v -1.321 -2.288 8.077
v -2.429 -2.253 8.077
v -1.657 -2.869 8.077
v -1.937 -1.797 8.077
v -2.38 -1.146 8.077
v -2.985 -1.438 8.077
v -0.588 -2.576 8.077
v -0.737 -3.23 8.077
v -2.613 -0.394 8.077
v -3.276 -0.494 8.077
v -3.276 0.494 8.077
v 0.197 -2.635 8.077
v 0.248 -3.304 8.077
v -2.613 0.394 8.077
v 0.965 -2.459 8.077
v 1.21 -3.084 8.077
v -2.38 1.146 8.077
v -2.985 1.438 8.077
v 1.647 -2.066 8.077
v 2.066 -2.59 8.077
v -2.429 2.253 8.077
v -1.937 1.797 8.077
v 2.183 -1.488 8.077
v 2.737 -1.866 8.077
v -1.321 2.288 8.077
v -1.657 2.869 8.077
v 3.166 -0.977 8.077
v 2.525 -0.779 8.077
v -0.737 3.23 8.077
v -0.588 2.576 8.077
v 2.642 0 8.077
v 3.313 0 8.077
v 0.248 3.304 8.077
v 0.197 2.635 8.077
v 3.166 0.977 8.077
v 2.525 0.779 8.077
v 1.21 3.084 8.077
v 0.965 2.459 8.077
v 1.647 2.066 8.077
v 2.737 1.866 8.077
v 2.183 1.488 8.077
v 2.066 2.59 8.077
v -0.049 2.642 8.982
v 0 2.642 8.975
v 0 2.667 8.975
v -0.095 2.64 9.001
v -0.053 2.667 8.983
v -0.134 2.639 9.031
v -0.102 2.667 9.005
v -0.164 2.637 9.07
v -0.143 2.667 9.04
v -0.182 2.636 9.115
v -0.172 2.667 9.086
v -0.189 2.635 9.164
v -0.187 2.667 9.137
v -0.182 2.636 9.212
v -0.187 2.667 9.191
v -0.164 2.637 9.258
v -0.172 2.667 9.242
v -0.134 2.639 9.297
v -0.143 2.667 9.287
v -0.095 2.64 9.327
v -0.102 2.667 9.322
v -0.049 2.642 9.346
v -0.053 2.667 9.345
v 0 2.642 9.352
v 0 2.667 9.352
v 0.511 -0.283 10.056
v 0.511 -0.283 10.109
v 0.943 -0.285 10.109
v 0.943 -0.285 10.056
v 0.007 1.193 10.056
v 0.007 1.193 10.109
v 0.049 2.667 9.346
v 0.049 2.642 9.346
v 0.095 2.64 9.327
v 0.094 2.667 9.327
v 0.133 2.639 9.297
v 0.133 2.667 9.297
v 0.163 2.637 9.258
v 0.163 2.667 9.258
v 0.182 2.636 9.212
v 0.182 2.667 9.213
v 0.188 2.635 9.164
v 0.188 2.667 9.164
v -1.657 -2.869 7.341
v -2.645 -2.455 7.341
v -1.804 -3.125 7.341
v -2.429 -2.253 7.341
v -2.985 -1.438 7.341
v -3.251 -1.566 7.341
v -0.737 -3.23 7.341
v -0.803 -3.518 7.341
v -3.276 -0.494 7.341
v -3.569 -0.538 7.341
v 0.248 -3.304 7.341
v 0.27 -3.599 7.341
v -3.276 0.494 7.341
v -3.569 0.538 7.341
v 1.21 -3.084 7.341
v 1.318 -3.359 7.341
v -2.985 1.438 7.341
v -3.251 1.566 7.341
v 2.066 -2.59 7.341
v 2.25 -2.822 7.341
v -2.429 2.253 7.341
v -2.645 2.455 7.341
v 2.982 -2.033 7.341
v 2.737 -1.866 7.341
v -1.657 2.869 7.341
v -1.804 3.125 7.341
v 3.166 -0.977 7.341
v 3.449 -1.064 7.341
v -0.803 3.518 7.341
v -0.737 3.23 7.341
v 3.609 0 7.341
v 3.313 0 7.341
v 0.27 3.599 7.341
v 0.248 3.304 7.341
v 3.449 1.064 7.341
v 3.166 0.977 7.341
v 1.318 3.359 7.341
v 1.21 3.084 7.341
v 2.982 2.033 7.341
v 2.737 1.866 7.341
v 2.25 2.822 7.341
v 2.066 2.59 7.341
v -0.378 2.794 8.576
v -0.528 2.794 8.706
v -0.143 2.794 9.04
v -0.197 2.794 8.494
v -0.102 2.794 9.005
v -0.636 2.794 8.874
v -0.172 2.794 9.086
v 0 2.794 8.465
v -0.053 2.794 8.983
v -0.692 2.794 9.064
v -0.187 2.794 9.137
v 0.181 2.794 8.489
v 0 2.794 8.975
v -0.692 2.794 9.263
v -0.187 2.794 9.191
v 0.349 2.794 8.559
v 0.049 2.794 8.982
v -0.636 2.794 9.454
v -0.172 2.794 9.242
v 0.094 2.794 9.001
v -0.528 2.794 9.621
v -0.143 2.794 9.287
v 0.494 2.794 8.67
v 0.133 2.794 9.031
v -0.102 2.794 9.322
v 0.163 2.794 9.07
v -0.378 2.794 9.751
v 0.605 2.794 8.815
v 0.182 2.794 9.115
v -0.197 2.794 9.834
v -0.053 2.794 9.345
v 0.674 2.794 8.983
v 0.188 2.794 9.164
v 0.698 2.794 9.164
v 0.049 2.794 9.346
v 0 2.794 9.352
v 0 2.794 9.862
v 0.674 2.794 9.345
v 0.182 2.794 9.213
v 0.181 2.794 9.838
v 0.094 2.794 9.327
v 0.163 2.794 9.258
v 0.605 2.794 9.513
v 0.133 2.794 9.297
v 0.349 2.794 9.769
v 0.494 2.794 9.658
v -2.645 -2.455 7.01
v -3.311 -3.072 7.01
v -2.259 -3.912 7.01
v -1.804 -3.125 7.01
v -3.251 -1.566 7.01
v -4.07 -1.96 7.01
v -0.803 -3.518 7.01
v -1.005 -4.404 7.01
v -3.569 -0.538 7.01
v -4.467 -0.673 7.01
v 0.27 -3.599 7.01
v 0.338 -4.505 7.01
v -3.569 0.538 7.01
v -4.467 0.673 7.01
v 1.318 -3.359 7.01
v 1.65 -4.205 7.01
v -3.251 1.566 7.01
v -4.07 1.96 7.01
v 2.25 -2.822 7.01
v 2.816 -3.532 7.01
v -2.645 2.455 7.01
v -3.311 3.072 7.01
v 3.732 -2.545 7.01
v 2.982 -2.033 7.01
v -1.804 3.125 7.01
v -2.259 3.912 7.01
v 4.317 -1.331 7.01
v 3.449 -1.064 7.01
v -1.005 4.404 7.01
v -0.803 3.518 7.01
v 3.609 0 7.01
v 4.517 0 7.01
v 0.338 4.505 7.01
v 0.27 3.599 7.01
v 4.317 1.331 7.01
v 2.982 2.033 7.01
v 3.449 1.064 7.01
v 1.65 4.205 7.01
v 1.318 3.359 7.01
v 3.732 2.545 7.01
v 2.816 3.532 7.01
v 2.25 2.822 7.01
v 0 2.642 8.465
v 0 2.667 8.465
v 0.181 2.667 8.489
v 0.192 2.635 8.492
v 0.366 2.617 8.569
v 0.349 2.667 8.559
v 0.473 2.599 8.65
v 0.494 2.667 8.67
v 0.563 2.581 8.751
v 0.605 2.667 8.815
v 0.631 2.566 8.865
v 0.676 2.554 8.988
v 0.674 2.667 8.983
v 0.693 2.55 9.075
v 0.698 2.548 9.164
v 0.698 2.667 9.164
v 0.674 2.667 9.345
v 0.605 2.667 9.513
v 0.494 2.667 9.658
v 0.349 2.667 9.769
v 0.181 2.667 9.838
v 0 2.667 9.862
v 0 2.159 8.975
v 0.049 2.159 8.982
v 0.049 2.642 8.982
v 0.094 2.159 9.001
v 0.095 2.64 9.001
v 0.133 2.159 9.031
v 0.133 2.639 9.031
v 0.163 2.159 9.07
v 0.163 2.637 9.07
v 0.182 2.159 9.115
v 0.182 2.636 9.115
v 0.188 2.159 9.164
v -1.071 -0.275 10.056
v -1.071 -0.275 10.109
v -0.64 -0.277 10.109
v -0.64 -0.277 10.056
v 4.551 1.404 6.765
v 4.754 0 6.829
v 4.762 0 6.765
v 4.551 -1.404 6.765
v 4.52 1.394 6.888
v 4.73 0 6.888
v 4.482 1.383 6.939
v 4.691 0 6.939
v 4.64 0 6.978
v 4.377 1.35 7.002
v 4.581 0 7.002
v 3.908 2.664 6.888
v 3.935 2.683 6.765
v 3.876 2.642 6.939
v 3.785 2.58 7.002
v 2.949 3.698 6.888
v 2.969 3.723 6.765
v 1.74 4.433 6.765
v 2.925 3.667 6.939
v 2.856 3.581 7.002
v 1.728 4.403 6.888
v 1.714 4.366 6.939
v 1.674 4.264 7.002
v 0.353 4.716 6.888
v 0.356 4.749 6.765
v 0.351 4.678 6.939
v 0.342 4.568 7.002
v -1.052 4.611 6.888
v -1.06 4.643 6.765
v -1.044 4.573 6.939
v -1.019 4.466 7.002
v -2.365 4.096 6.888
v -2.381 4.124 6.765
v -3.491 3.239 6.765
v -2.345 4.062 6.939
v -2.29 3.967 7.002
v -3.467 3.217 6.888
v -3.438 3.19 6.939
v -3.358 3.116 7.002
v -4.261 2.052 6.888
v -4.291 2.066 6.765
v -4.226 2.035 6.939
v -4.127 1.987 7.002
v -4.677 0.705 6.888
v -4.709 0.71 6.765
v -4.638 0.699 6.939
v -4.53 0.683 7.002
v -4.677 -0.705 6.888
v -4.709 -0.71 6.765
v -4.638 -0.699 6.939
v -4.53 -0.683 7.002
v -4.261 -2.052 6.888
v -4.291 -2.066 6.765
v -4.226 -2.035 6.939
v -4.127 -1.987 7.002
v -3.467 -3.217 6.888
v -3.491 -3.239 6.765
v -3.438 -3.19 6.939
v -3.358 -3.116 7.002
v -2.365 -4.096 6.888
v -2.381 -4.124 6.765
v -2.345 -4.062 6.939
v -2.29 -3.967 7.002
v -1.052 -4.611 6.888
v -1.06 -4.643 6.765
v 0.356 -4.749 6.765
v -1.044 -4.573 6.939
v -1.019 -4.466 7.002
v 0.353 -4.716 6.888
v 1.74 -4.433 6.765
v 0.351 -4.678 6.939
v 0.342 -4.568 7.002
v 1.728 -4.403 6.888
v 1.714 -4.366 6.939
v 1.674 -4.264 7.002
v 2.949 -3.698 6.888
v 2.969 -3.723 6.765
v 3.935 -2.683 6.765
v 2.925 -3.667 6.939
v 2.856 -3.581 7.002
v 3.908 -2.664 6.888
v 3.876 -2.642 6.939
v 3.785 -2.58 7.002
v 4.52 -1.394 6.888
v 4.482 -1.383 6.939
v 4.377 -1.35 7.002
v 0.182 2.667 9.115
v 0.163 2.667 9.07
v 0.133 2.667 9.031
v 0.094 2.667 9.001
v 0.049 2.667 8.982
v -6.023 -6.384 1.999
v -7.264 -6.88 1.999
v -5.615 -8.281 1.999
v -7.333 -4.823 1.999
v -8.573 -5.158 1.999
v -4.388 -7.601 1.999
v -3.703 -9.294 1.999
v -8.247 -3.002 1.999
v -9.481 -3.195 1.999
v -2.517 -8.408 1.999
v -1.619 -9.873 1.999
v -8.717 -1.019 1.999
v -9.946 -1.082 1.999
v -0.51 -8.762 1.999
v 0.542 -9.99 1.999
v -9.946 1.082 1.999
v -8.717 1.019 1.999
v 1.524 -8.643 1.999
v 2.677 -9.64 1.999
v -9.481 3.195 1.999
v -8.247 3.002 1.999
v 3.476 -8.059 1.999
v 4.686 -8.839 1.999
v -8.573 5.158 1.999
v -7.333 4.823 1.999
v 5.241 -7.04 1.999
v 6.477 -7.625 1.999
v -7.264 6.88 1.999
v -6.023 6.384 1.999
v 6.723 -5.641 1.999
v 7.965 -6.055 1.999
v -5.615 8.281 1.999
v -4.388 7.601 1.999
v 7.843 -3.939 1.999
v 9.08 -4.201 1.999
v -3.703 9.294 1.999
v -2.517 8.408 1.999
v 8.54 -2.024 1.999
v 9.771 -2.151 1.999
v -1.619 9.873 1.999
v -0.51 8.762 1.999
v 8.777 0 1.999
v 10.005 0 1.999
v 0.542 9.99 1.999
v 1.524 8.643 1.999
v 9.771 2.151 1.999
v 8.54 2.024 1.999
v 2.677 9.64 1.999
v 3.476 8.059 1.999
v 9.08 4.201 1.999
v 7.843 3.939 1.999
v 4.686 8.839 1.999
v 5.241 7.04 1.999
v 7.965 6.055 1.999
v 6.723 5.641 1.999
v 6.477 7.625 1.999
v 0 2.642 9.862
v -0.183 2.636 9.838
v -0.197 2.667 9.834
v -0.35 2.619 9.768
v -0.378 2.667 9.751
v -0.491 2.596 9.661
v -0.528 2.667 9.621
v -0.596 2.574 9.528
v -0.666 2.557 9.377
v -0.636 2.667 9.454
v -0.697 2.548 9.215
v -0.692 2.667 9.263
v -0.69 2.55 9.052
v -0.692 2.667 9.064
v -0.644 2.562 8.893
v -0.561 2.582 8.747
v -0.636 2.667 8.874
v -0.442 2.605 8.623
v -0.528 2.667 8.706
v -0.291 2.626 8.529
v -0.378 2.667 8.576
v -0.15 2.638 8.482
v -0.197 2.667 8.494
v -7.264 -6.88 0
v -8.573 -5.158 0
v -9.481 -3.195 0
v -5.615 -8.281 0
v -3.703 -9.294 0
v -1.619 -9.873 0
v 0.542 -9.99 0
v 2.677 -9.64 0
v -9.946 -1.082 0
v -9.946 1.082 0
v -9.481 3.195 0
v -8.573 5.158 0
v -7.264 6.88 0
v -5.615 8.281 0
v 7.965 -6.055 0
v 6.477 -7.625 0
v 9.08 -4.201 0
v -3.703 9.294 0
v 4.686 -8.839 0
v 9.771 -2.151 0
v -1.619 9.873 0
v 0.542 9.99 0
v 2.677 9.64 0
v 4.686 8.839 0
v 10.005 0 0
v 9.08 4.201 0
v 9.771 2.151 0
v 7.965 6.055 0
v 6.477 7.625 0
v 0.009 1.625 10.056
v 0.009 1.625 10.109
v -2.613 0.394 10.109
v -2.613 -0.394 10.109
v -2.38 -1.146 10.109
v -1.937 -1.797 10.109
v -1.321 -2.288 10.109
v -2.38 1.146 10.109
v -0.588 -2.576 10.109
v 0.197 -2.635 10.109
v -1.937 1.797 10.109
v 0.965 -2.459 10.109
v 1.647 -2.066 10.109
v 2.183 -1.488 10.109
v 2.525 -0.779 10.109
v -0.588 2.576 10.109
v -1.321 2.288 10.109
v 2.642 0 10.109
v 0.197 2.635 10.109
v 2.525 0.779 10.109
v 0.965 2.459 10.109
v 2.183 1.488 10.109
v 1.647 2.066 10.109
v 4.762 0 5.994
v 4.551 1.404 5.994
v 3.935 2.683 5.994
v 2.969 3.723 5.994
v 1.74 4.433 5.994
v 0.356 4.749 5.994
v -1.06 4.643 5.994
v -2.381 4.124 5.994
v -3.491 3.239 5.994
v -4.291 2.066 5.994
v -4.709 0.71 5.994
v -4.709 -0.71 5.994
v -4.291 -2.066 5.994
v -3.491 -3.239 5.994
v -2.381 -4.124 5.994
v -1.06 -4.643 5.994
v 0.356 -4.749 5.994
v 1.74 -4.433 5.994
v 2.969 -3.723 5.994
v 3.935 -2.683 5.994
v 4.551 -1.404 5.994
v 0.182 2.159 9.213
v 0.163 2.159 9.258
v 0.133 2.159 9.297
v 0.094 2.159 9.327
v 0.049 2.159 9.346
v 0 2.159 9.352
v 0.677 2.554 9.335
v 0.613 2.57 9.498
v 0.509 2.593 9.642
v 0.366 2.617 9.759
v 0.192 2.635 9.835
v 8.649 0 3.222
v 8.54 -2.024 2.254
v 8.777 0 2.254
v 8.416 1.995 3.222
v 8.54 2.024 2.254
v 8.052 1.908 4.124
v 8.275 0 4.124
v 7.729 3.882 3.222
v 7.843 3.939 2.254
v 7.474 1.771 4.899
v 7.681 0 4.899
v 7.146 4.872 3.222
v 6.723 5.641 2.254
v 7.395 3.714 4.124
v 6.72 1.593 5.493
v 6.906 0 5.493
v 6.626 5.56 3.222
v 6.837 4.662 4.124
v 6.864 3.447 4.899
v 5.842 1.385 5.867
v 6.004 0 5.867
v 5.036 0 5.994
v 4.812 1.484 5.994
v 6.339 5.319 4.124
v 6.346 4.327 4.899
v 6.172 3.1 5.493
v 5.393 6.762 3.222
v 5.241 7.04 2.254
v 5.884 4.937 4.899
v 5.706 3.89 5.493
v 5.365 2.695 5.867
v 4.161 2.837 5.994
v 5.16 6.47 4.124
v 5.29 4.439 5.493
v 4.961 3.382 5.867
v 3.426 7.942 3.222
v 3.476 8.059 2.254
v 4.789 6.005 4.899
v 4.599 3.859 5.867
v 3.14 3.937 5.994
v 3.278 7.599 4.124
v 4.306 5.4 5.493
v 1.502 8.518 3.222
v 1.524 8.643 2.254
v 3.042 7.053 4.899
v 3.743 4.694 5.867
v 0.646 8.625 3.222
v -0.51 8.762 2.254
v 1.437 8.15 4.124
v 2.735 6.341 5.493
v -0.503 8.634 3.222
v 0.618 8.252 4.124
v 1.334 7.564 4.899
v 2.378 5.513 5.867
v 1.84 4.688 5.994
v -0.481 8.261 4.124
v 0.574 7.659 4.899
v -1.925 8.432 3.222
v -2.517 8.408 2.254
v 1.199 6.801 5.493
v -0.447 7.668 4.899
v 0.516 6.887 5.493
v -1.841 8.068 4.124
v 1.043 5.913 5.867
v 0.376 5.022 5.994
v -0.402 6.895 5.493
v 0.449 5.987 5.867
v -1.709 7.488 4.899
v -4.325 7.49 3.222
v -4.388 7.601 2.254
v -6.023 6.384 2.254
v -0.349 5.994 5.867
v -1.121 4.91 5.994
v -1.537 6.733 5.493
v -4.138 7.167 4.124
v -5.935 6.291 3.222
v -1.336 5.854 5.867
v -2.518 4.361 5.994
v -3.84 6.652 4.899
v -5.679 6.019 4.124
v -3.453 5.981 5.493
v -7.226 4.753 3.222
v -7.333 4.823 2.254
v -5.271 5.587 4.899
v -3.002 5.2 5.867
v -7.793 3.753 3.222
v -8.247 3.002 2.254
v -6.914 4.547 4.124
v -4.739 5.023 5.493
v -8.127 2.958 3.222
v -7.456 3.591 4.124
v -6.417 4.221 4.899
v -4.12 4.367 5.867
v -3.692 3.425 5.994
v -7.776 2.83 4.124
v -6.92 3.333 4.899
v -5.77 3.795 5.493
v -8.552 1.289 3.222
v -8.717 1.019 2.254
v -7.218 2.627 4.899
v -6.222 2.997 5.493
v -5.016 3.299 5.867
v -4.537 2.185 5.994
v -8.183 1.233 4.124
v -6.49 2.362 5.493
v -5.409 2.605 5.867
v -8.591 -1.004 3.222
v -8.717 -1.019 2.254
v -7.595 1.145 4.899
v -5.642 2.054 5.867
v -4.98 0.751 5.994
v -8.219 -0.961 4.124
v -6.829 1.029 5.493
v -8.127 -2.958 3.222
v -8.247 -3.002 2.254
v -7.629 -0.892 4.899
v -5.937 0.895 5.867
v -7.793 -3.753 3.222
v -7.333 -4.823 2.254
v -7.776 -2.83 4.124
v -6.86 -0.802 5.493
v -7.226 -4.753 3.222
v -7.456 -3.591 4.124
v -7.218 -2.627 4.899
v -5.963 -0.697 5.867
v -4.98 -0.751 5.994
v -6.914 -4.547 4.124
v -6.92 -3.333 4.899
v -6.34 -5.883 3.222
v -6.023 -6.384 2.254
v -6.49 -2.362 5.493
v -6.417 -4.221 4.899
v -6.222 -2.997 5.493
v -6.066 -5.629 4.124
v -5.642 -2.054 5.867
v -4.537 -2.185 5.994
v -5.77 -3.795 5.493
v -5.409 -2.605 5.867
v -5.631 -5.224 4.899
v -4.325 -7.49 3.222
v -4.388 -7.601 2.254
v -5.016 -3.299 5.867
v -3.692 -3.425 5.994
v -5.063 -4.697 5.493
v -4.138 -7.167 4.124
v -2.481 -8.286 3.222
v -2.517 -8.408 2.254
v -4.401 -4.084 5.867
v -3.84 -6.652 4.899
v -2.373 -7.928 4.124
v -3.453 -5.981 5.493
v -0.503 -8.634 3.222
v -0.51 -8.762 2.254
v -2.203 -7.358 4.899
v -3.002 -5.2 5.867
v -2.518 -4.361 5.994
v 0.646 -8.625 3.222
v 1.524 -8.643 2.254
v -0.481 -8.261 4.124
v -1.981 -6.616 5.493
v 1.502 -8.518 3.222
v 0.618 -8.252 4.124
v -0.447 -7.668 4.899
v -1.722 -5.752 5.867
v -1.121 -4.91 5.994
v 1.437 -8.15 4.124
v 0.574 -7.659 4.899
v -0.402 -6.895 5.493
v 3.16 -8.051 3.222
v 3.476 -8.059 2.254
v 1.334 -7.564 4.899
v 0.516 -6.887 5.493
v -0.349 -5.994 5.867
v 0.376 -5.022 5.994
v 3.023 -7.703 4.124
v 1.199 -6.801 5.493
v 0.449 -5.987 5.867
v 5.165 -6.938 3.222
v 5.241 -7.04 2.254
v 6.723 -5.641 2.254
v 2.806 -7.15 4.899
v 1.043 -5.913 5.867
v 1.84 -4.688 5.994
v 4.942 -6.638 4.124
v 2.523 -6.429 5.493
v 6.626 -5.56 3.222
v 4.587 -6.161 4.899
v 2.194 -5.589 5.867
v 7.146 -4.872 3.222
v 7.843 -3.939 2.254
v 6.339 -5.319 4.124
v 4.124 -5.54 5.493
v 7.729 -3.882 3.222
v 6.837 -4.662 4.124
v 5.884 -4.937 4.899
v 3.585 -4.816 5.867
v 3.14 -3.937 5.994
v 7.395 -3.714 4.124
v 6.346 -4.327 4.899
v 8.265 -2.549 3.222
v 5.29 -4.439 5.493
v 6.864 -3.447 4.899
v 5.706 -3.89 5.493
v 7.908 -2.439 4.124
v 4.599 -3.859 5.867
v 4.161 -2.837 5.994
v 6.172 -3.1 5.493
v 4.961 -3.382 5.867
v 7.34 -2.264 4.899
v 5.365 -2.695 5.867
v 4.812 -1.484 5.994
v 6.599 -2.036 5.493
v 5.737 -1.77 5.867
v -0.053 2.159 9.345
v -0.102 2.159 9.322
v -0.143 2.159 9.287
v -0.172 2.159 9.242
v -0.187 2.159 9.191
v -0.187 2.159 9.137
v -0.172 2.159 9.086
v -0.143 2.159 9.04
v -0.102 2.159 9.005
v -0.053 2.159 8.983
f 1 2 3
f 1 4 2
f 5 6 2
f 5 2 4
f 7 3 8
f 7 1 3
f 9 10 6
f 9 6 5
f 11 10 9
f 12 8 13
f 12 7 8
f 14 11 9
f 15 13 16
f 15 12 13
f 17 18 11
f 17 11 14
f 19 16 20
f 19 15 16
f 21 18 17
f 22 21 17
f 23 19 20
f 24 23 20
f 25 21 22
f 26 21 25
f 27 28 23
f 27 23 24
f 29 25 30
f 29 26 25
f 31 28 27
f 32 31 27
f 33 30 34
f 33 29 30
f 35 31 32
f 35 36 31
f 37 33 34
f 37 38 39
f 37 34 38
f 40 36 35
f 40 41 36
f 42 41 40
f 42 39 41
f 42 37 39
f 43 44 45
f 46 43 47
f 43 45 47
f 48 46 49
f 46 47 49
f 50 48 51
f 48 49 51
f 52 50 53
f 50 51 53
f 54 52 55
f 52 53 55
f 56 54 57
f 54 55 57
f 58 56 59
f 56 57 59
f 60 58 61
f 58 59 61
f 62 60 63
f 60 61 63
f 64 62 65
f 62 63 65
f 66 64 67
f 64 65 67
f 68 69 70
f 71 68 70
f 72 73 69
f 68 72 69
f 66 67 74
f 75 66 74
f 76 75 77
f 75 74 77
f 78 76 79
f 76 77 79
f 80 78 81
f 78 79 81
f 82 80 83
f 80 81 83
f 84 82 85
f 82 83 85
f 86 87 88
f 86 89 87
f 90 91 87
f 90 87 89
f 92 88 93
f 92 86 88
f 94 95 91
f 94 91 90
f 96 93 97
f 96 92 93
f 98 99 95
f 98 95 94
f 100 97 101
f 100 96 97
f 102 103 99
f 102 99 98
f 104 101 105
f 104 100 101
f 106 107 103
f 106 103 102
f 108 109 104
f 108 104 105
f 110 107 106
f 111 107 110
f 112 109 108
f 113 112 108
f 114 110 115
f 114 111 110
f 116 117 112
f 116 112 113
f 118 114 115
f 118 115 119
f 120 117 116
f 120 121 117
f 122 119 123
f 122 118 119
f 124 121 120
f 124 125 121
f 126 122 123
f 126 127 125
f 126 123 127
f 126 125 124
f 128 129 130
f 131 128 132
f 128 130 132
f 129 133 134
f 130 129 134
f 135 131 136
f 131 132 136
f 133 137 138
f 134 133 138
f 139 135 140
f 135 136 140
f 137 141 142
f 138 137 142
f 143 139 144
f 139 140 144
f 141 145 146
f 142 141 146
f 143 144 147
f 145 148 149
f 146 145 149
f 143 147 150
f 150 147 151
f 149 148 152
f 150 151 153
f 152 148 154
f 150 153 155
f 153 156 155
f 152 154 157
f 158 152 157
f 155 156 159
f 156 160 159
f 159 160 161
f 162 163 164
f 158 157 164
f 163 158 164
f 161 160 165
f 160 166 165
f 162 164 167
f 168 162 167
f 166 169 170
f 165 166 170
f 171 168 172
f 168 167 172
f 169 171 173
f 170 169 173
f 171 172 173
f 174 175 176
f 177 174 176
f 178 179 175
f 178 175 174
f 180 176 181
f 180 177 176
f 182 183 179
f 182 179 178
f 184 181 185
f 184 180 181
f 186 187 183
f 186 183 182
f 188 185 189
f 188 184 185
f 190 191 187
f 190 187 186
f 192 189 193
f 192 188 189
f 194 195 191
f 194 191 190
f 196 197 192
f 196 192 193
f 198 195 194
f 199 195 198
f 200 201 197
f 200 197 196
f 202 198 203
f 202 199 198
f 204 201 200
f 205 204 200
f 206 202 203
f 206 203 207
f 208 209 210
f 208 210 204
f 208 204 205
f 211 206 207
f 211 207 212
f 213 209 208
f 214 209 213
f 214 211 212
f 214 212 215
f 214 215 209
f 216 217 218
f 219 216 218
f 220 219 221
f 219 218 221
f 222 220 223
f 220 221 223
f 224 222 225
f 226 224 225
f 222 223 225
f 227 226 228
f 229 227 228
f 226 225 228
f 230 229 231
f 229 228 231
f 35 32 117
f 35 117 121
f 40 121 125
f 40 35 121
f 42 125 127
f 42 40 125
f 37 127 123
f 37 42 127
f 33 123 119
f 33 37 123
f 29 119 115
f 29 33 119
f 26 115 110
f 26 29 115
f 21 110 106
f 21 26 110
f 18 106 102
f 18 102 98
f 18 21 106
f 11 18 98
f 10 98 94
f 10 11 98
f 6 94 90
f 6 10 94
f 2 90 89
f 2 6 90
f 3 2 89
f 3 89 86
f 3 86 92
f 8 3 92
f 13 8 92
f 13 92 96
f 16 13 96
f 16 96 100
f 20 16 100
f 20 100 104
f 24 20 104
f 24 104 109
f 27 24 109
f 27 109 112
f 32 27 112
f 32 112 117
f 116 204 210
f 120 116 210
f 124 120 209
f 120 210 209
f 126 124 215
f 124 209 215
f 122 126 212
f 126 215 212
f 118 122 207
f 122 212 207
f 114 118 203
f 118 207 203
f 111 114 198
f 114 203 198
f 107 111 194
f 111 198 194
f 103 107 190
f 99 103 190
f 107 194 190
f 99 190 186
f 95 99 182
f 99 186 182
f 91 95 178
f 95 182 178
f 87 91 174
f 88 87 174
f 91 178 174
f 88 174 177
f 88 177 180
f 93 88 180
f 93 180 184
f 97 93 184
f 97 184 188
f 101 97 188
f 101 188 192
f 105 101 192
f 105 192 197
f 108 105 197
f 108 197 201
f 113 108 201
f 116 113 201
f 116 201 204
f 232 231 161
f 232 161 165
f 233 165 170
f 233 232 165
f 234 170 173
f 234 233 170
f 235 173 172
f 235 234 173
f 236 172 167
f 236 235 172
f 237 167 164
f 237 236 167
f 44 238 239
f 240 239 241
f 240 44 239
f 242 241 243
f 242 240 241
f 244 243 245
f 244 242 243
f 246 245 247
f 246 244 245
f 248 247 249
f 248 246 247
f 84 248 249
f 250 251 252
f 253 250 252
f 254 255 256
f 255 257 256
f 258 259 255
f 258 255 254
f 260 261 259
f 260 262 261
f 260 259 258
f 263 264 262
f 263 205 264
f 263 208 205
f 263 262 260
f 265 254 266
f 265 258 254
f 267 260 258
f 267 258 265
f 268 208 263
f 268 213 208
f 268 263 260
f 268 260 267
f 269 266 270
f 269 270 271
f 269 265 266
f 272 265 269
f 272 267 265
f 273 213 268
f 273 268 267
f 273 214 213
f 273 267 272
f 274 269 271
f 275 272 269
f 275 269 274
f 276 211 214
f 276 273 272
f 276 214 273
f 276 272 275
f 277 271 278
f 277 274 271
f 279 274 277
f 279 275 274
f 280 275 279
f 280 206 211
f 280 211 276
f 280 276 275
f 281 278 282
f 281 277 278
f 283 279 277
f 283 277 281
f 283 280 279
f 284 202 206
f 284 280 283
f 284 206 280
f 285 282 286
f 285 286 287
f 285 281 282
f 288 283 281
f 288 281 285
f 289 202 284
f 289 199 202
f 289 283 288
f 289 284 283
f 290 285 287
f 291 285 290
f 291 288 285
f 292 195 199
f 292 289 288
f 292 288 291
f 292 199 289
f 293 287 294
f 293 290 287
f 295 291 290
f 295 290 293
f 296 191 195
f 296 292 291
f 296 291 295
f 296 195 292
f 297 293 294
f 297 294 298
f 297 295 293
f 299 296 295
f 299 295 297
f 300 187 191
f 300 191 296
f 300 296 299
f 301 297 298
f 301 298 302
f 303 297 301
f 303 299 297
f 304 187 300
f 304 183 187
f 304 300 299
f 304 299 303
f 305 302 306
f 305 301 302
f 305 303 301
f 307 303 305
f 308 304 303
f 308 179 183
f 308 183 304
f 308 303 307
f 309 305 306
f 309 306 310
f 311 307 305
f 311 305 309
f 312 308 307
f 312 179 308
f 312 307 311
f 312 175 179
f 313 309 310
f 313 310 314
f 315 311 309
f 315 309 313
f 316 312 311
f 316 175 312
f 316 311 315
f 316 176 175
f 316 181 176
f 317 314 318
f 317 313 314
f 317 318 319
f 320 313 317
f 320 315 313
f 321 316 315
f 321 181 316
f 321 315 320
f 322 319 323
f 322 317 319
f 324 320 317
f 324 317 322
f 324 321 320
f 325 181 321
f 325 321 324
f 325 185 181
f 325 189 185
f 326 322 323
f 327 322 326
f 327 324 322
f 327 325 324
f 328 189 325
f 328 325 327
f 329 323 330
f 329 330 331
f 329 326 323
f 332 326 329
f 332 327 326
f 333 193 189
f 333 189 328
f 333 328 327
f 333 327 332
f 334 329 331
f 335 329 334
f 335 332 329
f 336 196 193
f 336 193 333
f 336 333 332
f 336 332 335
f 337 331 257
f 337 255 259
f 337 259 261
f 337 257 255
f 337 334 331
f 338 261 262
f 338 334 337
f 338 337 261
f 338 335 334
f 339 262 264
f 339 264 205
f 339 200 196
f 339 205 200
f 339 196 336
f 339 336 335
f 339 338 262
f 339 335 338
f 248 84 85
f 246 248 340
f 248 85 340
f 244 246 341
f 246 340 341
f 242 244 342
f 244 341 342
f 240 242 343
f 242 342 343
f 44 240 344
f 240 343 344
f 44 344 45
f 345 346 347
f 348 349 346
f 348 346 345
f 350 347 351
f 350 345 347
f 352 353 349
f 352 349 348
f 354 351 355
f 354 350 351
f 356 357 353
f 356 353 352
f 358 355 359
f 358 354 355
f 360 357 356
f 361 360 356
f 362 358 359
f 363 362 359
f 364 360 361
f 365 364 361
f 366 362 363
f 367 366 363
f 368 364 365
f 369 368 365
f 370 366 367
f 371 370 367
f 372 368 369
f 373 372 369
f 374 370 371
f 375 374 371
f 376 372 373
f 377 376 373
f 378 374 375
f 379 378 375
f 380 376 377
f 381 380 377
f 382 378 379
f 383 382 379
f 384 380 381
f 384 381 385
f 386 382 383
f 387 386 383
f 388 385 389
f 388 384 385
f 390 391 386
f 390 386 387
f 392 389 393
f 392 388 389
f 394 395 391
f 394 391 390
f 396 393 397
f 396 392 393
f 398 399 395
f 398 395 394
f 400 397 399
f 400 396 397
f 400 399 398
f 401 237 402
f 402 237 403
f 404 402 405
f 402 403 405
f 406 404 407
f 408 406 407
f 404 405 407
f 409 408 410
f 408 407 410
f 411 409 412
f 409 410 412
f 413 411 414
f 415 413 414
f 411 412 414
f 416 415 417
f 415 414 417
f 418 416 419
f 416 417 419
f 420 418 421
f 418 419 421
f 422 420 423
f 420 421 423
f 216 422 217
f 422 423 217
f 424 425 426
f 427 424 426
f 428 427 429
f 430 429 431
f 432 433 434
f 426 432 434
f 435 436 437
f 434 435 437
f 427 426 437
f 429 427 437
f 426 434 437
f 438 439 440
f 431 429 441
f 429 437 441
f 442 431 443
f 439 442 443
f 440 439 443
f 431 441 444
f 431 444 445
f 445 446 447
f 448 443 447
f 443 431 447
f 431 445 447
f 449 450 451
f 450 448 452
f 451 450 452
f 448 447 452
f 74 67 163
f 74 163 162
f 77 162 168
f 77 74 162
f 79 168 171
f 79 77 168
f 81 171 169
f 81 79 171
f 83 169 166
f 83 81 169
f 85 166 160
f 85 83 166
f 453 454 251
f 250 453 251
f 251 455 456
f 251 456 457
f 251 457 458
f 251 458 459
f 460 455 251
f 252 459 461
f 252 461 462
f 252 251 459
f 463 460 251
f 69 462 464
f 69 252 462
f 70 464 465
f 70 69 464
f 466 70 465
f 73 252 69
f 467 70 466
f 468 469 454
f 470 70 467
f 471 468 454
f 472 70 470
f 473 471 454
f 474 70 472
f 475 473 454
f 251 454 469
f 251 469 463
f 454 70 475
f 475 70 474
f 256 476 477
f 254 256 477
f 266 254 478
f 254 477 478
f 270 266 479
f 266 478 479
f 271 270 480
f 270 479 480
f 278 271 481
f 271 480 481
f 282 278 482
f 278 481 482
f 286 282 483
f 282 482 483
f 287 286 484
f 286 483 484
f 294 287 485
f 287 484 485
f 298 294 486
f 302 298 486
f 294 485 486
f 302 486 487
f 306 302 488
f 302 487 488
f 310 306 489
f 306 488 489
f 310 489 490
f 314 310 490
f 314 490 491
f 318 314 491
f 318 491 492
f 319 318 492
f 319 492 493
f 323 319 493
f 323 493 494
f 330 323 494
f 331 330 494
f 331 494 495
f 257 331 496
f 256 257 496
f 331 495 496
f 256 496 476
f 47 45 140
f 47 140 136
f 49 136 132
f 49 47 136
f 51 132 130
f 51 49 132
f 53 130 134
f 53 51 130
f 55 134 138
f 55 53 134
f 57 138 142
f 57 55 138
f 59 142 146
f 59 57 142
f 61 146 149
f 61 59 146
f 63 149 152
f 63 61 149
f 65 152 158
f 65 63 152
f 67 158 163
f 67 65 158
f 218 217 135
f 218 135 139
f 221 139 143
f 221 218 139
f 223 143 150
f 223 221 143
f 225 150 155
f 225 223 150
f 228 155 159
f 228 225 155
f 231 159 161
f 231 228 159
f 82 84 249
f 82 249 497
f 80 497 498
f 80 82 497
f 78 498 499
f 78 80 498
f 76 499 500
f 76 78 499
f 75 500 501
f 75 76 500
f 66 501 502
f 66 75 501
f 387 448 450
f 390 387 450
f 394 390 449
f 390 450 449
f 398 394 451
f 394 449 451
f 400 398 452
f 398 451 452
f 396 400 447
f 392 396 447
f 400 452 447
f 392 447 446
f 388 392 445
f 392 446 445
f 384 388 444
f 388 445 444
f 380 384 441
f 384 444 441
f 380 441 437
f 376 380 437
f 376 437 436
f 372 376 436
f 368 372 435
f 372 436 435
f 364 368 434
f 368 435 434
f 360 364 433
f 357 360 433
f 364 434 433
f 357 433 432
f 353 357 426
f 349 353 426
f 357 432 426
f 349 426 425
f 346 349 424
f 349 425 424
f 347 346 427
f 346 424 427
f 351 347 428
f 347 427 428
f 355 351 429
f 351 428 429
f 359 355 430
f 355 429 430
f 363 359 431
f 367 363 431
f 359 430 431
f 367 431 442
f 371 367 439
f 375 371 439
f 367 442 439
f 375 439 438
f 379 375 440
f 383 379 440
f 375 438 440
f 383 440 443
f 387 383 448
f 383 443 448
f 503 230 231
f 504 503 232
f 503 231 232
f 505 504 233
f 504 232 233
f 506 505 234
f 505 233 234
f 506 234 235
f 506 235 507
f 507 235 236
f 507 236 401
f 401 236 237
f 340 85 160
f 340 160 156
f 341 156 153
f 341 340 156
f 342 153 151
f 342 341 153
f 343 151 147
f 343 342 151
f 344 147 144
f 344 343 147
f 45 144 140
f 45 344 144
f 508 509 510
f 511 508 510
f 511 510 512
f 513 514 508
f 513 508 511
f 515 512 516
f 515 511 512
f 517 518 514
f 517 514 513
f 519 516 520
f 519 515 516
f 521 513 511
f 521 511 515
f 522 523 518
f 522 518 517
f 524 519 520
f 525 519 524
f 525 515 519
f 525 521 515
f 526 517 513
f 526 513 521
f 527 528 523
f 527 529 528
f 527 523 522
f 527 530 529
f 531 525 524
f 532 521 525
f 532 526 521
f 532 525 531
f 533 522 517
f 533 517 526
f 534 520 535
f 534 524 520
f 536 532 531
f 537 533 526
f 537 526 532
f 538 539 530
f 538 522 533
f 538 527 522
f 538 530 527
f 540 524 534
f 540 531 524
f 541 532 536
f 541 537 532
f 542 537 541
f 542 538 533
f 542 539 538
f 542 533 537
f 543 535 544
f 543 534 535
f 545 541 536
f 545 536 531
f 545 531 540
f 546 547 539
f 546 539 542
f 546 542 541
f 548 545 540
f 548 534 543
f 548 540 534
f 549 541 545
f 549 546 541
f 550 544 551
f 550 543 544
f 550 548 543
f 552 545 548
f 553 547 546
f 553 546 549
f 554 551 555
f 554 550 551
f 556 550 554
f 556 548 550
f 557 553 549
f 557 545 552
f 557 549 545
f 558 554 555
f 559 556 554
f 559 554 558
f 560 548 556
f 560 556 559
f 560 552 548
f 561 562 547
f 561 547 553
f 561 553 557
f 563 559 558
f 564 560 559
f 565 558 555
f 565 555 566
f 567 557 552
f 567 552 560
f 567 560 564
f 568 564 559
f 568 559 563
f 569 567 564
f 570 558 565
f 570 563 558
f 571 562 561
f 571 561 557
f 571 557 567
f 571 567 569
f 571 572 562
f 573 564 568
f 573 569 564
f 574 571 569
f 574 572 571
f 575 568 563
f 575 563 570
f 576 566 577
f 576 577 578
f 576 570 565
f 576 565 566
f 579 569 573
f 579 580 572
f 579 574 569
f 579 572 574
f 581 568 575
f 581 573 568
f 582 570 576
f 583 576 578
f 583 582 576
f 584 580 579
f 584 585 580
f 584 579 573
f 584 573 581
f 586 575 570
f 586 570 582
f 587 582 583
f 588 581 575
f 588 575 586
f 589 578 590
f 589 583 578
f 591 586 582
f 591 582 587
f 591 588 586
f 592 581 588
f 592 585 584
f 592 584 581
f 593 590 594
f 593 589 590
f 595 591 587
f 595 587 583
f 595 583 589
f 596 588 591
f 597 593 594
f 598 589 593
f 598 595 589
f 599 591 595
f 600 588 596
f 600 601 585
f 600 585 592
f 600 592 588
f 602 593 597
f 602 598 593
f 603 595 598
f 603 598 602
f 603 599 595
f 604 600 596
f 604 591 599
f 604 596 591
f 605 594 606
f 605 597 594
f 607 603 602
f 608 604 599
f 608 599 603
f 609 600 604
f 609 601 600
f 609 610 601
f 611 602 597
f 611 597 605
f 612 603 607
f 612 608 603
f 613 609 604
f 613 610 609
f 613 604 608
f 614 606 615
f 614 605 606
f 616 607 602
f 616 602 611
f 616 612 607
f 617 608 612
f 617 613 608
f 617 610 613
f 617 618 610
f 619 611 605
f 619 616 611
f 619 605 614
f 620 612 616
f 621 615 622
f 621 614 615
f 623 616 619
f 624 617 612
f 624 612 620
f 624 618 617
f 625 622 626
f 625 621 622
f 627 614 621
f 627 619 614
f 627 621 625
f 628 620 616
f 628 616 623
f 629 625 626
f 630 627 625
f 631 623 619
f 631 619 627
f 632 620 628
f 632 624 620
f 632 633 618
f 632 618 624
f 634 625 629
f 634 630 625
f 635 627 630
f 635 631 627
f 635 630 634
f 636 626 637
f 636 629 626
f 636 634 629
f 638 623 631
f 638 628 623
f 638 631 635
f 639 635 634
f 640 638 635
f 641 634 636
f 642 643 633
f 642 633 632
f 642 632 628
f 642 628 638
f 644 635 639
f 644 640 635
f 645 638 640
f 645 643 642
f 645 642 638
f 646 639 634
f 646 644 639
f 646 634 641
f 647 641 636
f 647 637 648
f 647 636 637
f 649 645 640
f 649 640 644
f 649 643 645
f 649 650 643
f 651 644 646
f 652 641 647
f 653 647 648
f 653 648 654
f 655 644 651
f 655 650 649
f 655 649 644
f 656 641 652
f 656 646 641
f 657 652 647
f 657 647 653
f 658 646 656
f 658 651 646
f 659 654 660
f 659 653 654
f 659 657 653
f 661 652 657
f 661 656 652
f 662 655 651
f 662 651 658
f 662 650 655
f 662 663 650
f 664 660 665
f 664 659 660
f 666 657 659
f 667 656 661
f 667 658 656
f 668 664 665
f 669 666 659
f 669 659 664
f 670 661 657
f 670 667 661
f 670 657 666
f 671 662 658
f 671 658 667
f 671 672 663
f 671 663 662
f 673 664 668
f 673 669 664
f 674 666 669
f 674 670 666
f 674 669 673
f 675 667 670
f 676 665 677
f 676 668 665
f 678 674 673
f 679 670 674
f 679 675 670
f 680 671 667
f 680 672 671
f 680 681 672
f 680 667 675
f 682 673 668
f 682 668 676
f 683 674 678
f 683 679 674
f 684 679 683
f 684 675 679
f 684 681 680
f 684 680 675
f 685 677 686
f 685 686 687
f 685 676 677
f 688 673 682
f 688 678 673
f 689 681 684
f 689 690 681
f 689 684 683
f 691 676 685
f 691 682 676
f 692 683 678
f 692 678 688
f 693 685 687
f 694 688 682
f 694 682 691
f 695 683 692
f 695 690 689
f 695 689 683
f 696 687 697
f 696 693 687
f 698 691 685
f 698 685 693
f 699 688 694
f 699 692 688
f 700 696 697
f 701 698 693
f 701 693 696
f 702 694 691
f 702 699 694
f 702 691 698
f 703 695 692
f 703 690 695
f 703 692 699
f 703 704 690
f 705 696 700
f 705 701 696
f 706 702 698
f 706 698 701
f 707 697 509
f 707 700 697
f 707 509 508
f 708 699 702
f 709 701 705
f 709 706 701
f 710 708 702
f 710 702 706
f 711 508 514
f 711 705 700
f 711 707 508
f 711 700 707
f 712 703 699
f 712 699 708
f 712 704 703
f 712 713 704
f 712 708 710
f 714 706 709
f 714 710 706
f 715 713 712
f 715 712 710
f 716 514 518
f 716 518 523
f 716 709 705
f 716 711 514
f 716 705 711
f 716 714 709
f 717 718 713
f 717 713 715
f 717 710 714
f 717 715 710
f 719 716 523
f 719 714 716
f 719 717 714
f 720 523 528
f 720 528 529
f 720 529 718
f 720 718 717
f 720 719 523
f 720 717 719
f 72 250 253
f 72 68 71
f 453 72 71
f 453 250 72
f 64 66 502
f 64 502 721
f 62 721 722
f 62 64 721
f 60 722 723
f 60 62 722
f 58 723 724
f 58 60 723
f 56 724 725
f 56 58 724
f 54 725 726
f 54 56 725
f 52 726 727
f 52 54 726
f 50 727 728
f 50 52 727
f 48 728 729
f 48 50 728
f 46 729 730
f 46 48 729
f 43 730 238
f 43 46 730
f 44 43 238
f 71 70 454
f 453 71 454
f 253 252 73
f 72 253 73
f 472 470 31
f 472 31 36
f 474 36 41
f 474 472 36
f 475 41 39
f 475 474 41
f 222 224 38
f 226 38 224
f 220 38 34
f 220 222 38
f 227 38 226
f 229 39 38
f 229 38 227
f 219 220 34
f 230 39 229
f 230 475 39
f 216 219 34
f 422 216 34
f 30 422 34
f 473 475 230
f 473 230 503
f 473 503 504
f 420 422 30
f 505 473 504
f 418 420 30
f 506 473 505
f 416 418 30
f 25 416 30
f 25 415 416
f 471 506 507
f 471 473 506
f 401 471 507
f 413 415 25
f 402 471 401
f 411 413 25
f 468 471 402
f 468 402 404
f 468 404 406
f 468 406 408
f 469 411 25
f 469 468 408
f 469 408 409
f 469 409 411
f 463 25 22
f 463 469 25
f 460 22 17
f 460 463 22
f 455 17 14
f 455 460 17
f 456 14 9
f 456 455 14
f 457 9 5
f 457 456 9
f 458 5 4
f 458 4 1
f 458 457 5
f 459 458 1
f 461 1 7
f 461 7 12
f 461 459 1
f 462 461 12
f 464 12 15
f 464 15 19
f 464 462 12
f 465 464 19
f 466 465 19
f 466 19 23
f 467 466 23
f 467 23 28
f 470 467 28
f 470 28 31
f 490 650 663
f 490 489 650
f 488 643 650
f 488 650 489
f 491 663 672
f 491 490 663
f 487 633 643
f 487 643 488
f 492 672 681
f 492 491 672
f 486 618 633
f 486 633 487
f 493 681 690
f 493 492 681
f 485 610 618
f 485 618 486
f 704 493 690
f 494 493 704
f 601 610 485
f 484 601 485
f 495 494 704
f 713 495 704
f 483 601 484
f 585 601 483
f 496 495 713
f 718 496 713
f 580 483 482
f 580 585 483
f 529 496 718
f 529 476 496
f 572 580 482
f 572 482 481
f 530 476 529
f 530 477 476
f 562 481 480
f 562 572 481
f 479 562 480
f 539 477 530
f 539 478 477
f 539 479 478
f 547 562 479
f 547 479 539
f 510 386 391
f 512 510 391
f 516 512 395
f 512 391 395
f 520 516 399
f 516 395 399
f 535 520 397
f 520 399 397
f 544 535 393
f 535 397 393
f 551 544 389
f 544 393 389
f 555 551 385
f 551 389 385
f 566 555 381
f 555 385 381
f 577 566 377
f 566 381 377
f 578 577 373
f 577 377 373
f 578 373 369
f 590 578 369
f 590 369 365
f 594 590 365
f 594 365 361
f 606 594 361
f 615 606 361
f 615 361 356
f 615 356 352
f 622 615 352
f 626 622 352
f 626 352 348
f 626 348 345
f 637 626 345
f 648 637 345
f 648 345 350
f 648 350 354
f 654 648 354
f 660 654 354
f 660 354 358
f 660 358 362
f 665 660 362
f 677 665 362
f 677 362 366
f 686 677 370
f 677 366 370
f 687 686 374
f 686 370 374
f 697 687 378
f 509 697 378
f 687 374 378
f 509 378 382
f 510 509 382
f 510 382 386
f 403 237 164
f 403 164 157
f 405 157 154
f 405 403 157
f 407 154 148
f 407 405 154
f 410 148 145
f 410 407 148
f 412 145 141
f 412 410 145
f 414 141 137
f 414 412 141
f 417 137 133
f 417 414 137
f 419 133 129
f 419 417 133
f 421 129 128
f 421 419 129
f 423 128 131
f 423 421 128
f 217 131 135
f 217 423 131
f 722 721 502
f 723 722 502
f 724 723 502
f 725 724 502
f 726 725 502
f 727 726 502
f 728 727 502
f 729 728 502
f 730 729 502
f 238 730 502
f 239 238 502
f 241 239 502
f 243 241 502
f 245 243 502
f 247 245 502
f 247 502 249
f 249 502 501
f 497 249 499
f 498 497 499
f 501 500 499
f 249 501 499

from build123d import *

# Parameters (mm, degrees)
F0_R      = 10.0048982814
F0_R_2    = 8.7765216672
F1_DEPTH  = 1.99898
F0_R_3    = 3.608871
F2_DEPTH  = 5.9944
F3_DEPTH  = 10.1092
F4_R      = 3.7405824935
F5_R      = 4.7625
F6_DEPTH  = 1.016
F7_R      = 0.2452840979
F8_R      = 3.608871
F8_R_2    = 3.3131091119
F9_DEPTH  = 2.7686
F8_R_3    = 2.6420381333
F10_DEPTH = 2.032
F13_DEPTH = 0.127
F14_DEPTH = 0.508
F15_DEPTH = 0.05334


with BuildPart() as f1:
    # F0 (on Top) → F1 (new body)
    with BuildSketch(Plane.XY):
        Circle(F0_R)
        Circle(F0_R_2, mode=Mode.SUBTRACT)
    extrude(amount=F1_DEPTH)

    # F0 (on Top) → F2 (join)
    with BuildSketch(Plane.XY):
        Circle(F0_R_2)
        Circle(F0_R_3, mode=Mode.SUBTRACT)
        Circle(F0_R_3)
    extrude(amount=F2_DEPTH)

    # F0 (on Top) → F3 (join)
    with BuildSketch(Plane.XY):
        Circle(F0_R_3)
    extrude(amount=F3_DEPTH)

    # F4
    f4_edges = [f1.edges().sort_by_distance(p)[0] for p in [
        (-8.776522, 0, 5.9944),
    ]]
    fillet(f4_edges, radius=F4_R)

    # F5 (on face) → F6 (join)
    with BuildSketch(Plane.XY.offset(5.9944)):
        Circle(F5_R)
    extrude(amount=F6_DEPTH)

    # F7
    f7_edges = [f1.edges().sort_by_distance(p)[0] for p in [
        (-4.7625, 0, 7.0104),
    ]]
    fillet(f7_edges, radius=F7_R)

    # F8 (on face) → F9 (cut)
    with BuildSketch(Plane.XY.offset(10.1092)):
        Circle(F8_R)
        Circle(F8_R_2, mode=Mode.SUBTRACT)
    extrude(amount=-F9_DEPTH, mode=Mode.SUBTRACT)

    # F8 (on face) → F10 (cut)
    with BuildSketch(Plane.XY.offset(10.1092)):
        Circle(F8_R_2)
        Circle(F8_R_3, mode=Mode.SUBTRACT)
    extrude(amount=-F10_DEPTH, mode=Mode.SUBTRACT)

    # F12 (on offset) → F13 (join, symmetric)
    with BuildSketch(Plane.XZ.offset(-2.667)):
        with BuildLine():
            ThreePointArc((0.6982848187, 9.1637990087), (0.4936989053, 9.6577130953), (-0.0002151813, 9.8622990087))
            Line((-0.0002151813, 9.8622990087), (-0.0002151813, 9.3522478652))
            ThreePointArc((-0.0002151813, 9.3522478652), (0.1330382831, 9.2970524731), (0.1882336753, 9.1637990087))
            ThreePointArc((0.1882336753, 9.1637990087), (0.1330382831, 9.0305455443), (-0.0002151813, 8.9753501521))
            Line((-0.0002151813, 8.9753501521), (-0.0002151813, 8.4652990087))
            ThreePointArc((-0.0002151813, 8.4652990087), (0.4936989053, 8.669884922), (0.6982848187, 9.1637990087))
        make_face()
        with BuildLine():
            Line((-0.0002151813, 9.3522478652), (-0.0002151813, 9.8622990087))
            ThreePointArc((-0.0002151813, 9.8622990087), (-0.6987151813, 9.1637990087), (-0.0002151813, 8.4652990087))
            Line((-0.0002151813, 8.4652990087), (-0.0002151813, 8.9753501521))
            ThreePointArc((-0.0002151813, 8.9753501521), (-0.1886640379, 9.1637990087), (-0.0002151813, 9.3522478652))
        make_face()
    extrude(amount=F13_DEPTH, both=True)

    # F12 (on offset) → F14 (cut)
    with BuildSketch(Plane.XZ.offset(-2.667)):
        with BuildLine():
            ThreePointArc((0.1882336753, 9.1637990087), (0.1330382831, 9.2970524731), (-0.0002151813, 9.3522478652))
            Line((-0.0002151813, 9.3522478652), (-0.0002151813, 8.9753501521))
            ThreePointArc((-0.0002151813, 8.9753501521), (0.1330382831, 9.0305455443), (0.1882336753, 9.1637990087))
        make_face()
        with BuildLine():
            Line((-0.0002151813, 8.9753501521), (-0.0002151813, 9.3522478652))
            ThreePointArc((-0.0002151813, 9.3522478652), (-0.1886640379, 9.1637990087), (-0.0002151813, 8.9753501521))
        make_face()
    extrude(amount=F14_DEPTH, mode=Mode.SUBTRACT)

    # F8 (on face) → F15 (cut)
    with BuildSketch(Plane.XY.offset(10.1092)):
        Polygon((0.008962602, 1.624630818), (-1.0713262968, -0.2752078575), (-0.6395262968, -0.2772395093), (0.0069309502, 1.192830818), (0.5111417182, -0.2826534897), (0.9429417182, -0.2846851415), align=None)
    extrude(amount=-F15_DEPTH, mode=Mode.SUBTRACT)


solid = f1.part
